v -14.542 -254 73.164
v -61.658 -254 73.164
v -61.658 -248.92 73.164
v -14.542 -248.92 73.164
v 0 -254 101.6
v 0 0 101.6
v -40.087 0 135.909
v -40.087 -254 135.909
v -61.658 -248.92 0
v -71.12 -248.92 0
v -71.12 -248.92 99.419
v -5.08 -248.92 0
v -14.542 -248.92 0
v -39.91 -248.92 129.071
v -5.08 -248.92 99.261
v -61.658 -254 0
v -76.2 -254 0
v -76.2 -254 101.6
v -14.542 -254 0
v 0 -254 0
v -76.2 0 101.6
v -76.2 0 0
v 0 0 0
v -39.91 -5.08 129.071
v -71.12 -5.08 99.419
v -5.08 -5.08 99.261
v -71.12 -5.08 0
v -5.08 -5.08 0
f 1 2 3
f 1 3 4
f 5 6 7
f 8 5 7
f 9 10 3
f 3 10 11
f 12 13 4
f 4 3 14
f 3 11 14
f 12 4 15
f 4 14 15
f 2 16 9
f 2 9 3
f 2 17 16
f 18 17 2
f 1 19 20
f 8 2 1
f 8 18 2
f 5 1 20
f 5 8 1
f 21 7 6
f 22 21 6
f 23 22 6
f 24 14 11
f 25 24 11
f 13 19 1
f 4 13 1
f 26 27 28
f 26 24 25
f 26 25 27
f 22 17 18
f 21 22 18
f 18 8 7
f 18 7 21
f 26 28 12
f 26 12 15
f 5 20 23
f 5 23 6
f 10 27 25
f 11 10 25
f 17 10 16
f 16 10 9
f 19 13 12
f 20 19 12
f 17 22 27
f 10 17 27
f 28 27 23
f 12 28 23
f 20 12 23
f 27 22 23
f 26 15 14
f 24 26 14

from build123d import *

# Parameters (mm, degrees)
F0_W     = 76.2
F0_H     = 101.6
F1_DEPTH = 254
F3_DEPTH = 254
F4_T     = -5.08
F5_W     = 47.115137
F5_H     = 73.164374
F6_DEPTH = 5.08


with BuildPart() as f1:
    # F0 (on Front) → F1 (new body)
    with BuildSketch(Plane.XZ):
        with Locations((-38.1, 50.8)):
            Rectangle(F0_W, F0_H)
    extrude(amount=F1_DEPTH)

    # F2 (on face) → F3 (join)
    with BuildSketch(Plane.XZ.offset(254)):
        Polygon((-40.087454, 135.909051), (-76.2, 101.6), (0, 101.6), align=None)
    extrude(amount=-F3_DEPTH)

    # F4
    f4_openings = [f1.faces().sort_by_distance(p)[0] for p in [
        (-38.1, -127, 0),
    ]]
    offset(amount=F4_T, openings=f4_openings)

    # F5 (on face) → F6 (cut, through all)
    with BuildSketch(Plane.XZ.offset(254)):
        with Locations((-38.100001, 36.582187)):
            Rectangle(F5_W, F5_H)
    extrude(amount=-F6_DEPTH, mode=Mode.SUBTRACT)


solid = f1.part
